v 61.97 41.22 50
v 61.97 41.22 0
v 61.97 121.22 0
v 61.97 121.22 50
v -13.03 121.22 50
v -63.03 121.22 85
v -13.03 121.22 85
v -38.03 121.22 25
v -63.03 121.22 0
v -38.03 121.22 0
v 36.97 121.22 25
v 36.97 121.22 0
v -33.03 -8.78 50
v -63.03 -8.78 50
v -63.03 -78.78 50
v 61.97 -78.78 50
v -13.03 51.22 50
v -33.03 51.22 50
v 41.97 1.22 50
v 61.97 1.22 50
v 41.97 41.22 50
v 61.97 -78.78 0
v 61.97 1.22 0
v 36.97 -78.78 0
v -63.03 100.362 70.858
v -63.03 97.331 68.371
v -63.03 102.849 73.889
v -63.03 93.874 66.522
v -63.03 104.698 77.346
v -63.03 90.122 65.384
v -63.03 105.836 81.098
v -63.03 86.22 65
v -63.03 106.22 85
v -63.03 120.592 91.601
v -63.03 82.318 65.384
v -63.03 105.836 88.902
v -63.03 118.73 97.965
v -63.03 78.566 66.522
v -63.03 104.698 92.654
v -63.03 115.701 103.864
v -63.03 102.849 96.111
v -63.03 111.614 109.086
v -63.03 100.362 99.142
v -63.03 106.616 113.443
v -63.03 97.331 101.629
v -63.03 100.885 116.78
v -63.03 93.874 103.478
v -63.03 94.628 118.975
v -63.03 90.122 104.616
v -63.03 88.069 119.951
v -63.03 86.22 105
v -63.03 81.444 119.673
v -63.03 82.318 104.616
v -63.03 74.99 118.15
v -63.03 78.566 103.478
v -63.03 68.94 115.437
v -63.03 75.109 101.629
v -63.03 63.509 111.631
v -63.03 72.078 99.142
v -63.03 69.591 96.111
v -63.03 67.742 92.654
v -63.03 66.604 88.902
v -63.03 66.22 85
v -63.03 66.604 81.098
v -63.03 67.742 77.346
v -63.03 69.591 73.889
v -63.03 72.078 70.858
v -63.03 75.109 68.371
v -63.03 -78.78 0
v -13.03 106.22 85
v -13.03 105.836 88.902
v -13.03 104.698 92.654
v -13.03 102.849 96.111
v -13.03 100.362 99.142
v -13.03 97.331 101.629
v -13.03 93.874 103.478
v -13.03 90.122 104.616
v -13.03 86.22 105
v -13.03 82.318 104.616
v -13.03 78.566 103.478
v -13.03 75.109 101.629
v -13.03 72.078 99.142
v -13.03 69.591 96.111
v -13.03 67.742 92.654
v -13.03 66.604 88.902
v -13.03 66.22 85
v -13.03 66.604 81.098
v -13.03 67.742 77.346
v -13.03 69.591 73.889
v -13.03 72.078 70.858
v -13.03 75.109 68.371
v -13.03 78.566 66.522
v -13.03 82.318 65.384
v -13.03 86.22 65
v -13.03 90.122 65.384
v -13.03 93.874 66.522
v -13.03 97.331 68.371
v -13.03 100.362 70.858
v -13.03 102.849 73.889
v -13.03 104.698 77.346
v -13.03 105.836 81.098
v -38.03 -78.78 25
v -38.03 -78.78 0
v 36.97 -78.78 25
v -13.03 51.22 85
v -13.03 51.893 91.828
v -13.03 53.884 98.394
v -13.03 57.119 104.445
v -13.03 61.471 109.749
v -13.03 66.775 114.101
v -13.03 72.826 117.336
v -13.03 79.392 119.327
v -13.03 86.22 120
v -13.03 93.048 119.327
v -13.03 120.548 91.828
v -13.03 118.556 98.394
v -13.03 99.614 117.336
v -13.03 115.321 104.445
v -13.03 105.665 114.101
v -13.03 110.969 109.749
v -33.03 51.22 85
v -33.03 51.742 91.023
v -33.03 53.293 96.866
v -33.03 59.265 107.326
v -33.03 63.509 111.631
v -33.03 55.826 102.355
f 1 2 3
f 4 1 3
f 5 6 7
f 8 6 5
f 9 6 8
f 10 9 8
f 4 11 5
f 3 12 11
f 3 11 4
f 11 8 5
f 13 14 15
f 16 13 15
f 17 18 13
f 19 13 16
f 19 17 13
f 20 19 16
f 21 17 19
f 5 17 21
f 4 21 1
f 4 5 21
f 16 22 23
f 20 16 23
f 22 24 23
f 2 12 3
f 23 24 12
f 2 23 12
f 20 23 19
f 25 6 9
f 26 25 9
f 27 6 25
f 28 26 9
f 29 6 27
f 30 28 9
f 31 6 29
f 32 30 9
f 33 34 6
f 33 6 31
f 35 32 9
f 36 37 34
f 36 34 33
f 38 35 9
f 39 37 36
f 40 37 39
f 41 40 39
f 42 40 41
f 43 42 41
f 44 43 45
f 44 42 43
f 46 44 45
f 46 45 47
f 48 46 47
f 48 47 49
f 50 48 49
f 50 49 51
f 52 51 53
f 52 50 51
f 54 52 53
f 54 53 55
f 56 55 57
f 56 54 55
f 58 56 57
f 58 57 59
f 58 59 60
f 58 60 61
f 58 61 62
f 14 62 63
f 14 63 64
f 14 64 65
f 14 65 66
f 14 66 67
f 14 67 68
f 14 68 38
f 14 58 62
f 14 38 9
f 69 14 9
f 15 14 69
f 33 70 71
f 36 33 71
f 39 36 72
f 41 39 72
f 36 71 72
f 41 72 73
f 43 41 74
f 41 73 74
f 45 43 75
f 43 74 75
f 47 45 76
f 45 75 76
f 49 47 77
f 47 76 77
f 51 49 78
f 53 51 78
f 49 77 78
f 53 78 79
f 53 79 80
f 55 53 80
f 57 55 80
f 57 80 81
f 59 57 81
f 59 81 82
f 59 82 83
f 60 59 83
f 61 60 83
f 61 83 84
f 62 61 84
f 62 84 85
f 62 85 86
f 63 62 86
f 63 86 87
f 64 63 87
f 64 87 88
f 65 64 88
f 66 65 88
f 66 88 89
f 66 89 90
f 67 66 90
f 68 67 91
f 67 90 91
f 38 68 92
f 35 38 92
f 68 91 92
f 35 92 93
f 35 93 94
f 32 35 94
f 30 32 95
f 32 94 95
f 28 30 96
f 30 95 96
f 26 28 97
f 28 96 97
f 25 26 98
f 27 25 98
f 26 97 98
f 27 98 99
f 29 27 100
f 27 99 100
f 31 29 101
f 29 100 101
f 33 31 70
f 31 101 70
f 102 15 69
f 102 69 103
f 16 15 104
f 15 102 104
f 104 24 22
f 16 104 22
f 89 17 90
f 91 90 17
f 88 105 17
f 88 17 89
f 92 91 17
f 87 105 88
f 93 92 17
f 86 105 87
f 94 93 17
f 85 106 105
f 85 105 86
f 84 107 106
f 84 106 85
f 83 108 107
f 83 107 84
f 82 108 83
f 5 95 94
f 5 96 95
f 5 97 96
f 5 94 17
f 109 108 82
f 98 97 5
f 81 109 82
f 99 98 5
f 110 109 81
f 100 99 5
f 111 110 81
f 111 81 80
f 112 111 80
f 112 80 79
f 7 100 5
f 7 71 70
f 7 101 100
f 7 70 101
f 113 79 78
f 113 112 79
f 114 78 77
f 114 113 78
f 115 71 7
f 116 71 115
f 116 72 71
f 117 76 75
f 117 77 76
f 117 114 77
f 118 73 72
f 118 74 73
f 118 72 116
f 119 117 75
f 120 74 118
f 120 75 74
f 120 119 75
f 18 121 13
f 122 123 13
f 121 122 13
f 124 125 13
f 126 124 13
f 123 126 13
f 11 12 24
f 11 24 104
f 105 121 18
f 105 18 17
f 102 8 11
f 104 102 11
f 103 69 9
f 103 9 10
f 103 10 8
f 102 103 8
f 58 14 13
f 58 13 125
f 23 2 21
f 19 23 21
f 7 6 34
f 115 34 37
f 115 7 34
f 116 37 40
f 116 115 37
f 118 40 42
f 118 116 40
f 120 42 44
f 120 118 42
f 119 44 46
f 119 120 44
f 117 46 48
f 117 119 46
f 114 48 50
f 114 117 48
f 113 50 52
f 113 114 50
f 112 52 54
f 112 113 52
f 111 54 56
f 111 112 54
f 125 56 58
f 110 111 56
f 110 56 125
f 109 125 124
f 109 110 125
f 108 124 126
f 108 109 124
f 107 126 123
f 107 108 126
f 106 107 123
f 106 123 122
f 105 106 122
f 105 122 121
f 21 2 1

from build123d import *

# Parameters (mm, degrees)
F0_W      = 125
F0_H      = 200
F1_DEPTH  = 50
F2_W      = 50
F2_H      = 70
F3_DEPTH  = 35
F5_DEPTH  = 50
F6_R      = 20
F7_DEPTH  = 50.001
F9_DEPTH  = 30
F10_W     = 75
F10_H     = 25
F11_DEPTH = 200.001
F12_W     = 40
F12_H     = 50
F13_DEPTH = 20
F15_DEPTH = 40


with BuildPart() as f1:
    # F0 (on Top) → F1 (new body)
    with BuildSketch(Plane.XY):
        with Locations((-0.529949, 21.220052)):
            Rectangle(F0_W, F0_H)
    extrude(amount=F1_DEPTH)

    # F2 (on face) → F3 (join)
    with BuildSketch(Plane.XY.offset(50)):
        with Locations((-38.029949, 86.220052)):
            Rectangle(F2_W, F2_H)
    extrude(amount=F3_DEPTH)

    # F4 (on face) → F5 (join)
    with BuildSketch(Plane.YZ.offset(-13.029949)):
        with BuildLine():
            Line((51.220052, 85), (121.220052, 85))
            ThreePointArc((121.220052, 85), (86.220052, 120), (51.220052, 85))
        make_face()
    extrude(amount=-F5_DEPTH)

    # F6 (on face) → F7 (cut, through all)
    with BuildSketch(Plane.YZ.offset(-13.029949)):
        with Locations((86.220052, 85)):
            Circle(F6_R)
    extrude(amount=-F7_DEPTH, mode=Mode.SUBTRACT)

    # F8 (on face) → F9 (join)
    with BuildSketch(Plane(origin=(-63.029949, 0, 0), x_dir=(0, -1, 0), z_dir=(-1, 0, 0))):
        with BuildLine():
            Line((-51.220052, 50), (8.779948, 50))
            Line((8.779948, 50), (-63.512735, 111.634146))
            ThreePointArc((-63.512735, 111.634146), (-54.441474, 99.667036), (-51.220052, 85))
            Line((-51.220052, 85), (-51.220052, 50))
        make_face()
    extrude(amount=-F9_DEPTH)

    # F10 (on face) → F11 (cut, through all)
    with BuildSketch(Plane.XZ.offset(78.779948)):
        with Locations((-0.529949, 12.5)):
            Rectangle(F10_W, F10_H)
    extrude(amount=-F11_DEPTH, mode=Mode.SUBTRACT)

    # F12 (on face) → F13 (cut)
    with BuildSketch(Plane.YZ.offset(61.970051)):
        with Locations((21.220052, 25)):
            Rectangle(F12_W, F12_H)
    extrude(amount=-F13_DEPTH, mode=Mode.SUBTRACT)

    # F14 (on face) → F15 (join)
    with BuildSketch(Plane.XZ.offset(-41.220052)):
        Polygon((61.970051, 0), (41.970051, 50), (41.970051, 0), align=None)
    extrude(amount=F15_DEPTH)


solid = f1.part
